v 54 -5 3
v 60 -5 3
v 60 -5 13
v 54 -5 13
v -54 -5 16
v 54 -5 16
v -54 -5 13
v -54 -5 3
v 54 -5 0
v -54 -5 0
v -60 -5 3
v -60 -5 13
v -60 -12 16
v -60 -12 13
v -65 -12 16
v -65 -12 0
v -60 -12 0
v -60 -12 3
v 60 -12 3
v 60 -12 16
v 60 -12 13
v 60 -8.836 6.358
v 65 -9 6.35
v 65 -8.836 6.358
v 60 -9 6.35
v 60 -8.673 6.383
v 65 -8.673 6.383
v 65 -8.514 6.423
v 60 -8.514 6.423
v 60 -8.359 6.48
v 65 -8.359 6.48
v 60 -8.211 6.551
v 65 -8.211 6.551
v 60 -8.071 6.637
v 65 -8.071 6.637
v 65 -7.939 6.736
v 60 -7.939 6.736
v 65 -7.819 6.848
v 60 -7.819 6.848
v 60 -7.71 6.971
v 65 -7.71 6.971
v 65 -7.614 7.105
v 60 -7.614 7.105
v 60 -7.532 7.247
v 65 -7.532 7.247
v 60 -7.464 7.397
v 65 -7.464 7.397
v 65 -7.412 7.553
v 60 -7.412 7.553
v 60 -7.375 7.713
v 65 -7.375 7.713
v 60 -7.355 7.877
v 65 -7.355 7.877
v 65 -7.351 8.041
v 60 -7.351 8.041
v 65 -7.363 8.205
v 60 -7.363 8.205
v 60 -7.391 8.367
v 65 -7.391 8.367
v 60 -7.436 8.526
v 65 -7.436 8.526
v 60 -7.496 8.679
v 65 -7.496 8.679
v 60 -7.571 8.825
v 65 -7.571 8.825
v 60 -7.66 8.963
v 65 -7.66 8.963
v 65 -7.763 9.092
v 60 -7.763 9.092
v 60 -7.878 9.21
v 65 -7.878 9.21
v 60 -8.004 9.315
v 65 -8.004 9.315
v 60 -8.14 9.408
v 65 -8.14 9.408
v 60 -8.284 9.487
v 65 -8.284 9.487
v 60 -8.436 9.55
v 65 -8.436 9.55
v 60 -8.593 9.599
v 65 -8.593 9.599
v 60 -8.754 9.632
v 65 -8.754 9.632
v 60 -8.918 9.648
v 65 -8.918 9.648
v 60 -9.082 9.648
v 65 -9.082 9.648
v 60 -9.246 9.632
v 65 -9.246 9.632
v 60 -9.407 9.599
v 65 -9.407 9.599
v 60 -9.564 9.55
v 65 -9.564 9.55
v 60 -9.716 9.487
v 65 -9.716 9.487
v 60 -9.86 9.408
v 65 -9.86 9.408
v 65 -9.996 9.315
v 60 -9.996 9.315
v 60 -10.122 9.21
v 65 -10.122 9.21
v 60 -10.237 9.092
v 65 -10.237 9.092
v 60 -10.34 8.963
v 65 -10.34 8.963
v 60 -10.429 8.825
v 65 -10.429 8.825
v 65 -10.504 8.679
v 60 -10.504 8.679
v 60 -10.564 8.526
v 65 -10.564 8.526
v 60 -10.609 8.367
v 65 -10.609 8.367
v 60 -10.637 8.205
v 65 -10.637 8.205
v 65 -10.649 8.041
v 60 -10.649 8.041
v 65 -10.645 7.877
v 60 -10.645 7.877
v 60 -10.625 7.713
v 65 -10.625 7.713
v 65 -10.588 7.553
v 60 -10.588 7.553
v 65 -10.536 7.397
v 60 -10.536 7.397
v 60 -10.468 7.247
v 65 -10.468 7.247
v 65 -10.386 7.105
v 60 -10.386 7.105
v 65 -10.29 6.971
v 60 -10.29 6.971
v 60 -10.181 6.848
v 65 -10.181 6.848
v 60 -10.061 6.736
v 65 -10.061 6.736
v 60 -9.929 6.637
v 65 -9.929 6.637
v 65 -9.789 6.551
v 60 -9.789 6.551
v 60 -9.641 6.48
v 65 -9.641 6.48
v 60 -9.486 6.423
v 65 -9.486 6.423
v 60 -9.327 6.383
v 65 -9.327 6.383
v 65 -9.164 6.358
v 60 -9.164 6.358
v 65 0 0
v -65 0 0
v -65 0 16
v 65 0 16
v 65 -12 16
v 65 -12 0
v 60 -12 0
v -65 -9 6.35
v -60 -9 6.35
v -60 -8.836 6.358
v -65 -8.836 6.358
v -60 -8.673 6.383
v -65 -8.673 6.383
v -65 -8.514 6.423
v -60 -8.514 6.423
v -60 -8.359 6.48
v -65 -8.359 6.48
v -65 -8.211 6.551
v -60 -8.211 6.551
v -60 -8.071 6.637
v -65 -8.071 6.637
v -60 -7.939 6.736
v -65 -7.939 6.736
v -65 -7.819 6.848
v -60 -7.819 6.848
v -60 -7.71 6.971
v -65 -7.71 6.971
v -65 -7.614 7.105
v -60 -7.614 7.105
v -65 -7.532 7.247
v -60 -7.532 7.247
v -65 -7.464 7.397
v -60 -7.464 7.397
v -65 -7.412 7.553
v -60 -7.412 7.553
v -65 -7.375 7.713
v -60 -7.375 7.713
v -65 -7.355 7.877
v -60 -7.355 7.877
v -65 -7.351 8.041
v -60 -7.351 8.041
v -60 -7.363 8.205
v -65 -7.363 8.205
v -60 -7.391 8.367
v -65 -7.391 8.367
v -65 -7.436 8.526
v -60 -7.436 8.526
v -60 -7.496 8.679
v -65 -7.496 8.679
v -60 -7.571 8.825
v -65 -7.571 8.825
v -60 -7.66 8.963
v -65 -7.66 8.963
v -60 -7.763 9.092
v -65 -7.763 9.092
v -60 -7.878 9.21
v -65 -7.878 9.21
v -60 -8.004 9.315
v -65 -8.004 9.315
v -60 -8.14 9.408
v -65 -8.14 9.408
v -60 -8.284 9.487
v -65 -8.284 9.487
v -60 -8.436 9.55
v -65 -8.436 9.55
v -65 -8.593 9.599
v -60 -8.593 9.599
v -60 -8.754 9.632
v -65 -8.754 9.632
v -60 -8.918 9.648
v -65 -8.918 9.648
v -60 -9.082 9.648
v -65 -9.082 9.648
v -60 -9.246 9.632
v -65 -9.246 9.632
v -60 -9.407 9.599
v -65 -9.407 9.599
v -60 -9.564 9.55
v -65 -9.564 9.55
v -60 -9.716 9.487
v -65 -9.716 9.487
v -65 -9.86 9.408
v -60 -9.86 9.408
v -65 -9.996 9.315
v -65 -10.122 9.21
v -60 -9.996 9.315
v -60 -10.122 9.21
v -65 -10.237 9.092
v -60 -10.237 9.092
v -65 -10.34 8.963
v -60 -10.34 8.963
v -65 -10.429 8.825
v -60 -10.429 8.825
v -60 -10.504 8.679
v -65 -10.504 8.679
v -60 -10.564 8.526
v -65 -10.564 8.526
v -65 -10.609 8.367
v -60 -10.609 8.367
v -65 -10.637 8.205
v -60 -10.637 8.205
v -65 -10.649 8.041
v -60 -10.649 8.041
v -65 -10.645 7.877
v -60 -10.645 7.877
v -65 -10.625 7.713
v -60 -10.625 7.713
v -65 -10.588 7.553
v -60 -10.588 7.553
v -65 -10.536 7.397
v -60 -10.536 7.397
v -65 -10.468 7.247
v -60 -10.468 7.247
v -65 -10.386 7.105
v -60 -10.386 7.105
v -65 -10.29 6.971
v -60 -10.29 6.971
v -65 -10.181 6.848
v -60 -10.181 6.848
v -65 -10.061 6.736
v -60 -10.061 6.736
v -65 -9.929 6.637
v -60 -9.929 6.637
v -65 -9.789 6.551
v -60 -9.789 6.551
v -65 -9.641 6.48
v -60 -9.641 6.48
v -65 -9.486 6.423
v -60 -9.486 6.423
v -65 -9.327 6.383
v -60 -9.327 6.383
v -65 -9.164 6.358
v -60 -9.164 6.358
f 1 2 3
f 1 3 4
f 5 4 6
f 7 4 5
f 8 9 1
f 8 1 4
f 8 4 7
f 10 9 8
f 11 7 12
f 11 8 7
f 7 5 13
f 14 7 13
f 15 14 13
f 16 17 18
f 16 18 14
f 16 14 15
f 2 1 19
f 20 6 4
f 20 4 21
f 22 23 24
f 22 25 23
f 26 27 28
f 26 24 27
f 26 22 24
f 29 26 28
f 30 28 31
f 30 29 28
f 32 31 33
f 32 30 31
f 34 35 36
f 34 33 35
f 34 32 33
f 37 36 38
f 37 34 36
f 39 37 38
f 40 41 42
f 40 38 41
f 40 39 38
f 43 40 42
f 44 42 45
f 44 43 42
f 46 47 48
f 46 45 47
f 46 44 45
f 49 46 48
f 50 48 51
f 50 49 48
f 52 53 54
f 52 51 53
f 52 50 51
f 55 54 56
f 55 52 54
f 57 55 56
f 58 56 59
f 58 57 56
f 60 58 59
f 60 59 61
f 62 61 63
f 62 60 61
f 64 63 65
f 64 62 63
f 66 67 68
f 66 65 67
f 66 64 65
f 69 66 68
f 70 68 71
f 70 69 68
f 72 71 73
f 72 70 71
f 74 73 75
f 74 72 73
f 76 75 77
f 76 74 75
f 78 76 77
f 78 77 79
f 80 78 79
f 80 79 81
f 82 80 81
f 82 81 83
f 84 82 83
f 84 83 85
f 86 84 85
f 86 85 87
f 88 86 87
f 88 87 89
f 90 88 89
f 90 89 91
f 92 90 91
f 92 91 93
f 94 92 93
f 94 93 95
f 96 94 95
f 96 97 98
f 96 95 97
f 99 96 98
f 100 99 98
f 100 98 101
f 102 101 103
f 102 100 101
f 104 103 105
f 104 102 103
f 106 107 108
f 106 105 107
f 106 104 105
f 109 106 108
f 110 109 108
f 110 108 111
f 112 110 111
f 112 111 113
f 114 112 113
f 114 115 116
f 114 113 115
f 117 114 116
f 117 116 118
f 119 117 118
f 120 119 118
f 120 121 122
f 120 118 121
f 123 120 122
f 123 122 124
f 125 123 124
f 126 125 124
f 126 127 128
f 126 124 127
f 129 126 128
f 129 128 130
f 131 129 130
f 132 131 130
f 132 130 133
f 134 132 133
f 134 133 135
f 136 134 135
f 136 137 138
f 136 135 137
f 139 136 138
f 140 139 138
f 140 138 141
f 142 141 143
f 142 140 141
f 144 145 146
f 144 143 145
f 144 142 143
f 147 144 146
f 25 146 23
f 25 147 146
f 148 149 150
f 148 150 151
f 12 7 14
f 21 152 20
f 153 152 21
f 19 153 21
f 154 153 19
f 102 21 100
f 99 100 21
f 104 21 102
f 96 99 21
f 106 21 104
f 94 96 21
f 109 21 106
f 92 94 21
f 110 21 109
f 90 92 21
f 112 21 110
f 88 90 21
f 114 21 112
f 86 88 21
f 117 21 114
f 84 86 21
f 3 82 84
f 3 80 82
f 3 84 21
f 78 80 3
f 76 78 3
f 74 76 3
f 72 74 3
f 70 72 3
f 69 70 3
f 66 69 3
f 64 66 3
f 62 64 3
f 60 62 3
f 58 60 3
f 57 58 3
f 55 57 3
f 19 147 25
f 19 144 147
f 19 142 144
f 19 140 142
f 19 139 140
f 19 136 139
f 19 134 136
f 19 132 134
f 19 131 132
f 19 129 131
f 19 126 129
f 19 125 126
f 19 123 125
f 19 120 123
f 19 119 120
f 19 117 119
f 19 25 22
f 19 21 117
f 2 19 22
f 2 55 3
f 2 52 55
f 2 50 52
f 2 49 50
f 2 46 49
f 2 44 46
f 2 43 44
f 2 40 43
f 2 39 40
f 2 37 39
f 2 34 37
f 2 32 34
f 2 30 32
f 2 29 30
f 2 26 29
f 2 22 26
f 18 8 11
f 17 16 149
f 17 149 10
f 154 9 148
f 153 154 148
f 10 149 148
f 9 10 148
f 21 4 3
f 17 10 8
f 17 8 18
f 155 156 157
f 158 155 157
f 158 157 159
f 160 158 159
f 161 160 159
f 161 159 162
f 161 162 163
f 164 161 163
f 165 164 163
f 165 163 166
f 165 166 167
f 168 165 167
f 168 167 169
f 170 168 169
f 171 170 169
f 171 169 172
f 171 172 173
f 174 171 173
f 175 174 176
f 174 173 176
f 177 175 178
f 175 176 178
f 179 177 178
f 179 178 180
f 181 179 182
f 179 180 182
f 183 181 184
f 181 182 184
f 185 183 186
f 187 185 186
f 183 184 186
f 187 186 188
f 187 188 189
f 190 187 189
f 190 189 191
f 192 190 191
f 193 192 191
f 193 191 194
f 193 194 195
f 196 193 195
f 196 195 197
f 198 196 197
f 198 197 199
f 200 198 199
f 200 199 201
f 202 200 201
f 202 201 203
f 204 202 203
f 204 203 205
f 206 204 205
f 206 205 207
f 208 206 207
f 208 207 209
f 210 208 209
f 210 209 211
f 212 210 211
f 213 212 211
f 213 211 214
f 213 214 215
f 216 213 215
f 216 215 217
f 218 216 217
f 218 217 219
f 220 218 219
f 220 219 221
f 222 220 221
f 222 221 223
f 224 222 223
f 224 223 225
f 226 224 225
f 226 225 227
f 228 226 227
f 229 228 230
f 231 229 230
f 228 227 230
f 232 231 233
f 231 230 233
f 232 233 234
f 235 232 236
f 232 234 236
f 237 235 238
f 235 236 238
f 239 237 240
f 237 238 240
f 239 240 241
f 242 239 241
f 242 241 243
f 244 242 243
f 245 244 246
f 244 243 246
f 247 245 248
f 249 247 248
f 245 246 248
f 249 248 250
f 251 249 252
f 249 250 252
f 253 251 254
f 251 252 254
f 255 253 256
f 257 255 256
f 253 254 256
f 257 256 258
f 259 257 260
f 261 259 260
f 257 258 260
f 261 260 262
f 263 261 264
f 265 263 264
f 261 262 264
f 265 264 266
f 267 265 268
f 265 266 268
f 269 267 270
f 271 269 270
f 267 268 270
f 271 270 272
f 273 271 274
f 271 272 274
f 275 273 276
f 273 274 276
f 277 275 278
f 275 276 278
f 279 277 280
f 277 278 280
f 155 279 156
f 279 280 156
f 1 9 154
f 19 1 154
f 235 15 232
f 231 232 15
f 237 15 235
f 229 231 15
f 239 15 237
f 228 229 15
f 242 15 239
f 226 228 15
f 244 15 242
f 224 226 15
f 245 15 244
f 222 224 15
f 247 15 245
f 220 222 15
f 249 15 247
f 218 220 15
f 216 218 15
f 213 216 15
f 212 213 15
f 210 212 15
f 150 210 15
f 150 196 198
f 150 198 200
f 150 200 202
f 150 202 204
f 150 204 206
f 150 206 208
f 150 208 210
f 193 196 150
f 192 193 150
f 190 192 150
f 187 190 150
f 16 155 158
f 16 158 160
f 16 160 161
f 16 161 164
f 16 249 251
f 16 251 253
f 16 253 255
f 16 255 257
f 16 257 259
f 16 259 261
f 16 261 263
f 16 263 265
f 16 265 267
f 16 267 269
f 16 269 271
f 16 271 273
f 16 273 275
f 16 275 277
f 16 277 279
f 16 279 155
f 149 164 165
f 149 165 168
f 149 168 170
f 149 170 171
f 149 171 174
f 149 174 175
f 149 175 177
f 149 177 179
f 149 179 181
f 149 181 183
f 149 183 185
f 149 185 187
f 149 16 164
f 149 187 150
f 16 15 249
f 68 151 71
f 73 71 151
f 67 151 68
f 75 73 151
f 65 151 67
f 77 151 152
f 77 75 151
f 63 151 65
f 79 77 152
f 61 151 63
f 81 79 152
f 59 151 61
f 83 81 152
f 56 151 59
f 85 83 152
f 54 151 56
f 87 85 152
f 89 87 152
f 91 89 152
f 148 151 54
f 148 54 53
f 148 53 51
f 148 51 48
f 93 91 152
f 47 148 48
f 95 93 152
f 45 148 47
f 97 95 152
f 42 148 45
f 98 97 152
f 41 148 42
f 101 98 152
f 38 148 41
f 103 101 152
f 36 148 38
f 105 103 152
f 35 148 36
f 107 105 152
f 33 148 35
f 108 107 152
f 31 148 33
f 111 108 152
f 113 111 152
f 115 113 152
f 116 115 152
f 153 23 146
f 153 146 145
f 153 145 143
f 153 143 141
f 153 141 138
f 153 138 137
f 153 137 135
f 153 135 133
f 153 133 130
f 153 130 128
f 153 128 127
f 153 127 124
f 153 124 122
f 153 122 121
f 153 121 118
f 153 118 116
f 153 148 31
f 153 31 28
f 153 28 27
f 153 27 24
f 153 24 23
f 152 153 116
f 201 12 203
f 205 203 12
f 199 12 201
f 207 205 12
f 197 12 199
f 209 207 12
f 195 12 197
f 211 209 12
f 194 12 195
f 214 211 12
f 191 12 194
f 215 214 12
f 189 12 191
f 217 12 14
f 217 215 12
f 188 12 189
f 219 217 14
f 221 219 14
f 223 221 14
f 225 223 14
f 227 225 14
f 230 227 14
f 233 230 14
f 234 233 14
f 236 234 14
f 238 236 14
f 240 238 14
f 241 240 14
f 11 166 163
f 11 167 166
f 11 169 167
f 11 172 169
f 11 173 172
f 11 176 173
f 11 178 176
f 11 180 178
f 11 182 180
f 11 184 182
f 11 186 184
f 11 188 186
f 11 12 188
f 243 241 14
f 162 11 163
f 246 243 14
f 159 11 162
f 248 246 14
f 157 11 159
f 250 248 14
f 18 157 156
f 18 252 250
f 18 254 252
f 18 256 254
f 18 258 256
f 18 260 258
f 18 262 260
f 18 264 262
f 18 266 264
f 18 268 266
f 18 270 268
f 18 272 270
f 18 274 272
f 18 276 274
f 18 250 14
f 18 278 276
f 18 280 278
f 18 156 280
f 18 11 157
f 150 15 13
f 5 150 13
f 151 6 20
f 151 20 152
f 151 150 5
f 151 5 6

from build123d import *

# Parameters (mm, degrees)
EXTRUDE_2_DEPTH          = 16
SKETCH_3_R               = 1.65
CUT_EXTRUDE_1_DEPTH      = 126
CUT_EXTRUDE_1_DEPTH_BACK = 6
EXTRUDE_3_DEPTH          = 3
MIRROR_2_COPY_1_DEPTH    = 3


with BuildPart() as part:
    # 草图1 → 凸台-拉伸2 (new body)
    with BuildSketch(Plane.XY):
        Polygon((-65, 0), (65, 0), (65, -12), (60, -12), (60, -5), (-60, -5), (-60, -12), (-65, -12), align=None)
    extrude(amount=EXTRUDE_2_DEPTH)

    # 草图3 → 切除-拉伸1 (cut, two sides)
    with BuildSketch(Plane(origin=(-60, 0, 0), x_dir=(0, 0, -1), z_dir=(1, 0, 0))) as cut_extrude_1_sk:
        with Locations((-8, -9)):
            Circle(SKETCH_3_R)
    extrude(amount=CUT_EXTRUDE_1_DEPTH, mode=Mode.SUBTRACT)
    extrude(cut_extrude_1_sk.sketch, amount=-CUT_EXTRUDE_1_DEPTH_BACK, mode=Mode.SUBTRACT)

    # 草图4 → 凸台-拉伸3 (add)
    with BuildSketch(Plane(origin=(0, 0, 0), x_dir=(-1, 0, 0), z_dir=(0, 0, -1))):
        Polygon((54, -5), (60, -12), (60, -5), align=None)
    extrude_3 = extrude(amount=-EXTRUDE_3_DEPTH)

    # 镜向1: 凸台-拉伸3 across plane
    add(extrude_3.mirror(Plane.XY.offset(8)))

    # 镜向2: 凸台-拉伸3 across plane
    add(extrude_3.mirror(Plane(origin=(0, 0, 0), x_dir=(0, 0, 1), z_dir=(1, 0, 0))))

    # 镜向2 copy 1 sketch → 镜向2 copy 1 (add)
    with BuildSketch(Plane.XY.offset(16)):
        Polygon((54, -5), (60, -12), (60, -5), align=None)
    extrude(amount=-MIRROR_2_COPY_1_DEPTH)


solid = part.part
